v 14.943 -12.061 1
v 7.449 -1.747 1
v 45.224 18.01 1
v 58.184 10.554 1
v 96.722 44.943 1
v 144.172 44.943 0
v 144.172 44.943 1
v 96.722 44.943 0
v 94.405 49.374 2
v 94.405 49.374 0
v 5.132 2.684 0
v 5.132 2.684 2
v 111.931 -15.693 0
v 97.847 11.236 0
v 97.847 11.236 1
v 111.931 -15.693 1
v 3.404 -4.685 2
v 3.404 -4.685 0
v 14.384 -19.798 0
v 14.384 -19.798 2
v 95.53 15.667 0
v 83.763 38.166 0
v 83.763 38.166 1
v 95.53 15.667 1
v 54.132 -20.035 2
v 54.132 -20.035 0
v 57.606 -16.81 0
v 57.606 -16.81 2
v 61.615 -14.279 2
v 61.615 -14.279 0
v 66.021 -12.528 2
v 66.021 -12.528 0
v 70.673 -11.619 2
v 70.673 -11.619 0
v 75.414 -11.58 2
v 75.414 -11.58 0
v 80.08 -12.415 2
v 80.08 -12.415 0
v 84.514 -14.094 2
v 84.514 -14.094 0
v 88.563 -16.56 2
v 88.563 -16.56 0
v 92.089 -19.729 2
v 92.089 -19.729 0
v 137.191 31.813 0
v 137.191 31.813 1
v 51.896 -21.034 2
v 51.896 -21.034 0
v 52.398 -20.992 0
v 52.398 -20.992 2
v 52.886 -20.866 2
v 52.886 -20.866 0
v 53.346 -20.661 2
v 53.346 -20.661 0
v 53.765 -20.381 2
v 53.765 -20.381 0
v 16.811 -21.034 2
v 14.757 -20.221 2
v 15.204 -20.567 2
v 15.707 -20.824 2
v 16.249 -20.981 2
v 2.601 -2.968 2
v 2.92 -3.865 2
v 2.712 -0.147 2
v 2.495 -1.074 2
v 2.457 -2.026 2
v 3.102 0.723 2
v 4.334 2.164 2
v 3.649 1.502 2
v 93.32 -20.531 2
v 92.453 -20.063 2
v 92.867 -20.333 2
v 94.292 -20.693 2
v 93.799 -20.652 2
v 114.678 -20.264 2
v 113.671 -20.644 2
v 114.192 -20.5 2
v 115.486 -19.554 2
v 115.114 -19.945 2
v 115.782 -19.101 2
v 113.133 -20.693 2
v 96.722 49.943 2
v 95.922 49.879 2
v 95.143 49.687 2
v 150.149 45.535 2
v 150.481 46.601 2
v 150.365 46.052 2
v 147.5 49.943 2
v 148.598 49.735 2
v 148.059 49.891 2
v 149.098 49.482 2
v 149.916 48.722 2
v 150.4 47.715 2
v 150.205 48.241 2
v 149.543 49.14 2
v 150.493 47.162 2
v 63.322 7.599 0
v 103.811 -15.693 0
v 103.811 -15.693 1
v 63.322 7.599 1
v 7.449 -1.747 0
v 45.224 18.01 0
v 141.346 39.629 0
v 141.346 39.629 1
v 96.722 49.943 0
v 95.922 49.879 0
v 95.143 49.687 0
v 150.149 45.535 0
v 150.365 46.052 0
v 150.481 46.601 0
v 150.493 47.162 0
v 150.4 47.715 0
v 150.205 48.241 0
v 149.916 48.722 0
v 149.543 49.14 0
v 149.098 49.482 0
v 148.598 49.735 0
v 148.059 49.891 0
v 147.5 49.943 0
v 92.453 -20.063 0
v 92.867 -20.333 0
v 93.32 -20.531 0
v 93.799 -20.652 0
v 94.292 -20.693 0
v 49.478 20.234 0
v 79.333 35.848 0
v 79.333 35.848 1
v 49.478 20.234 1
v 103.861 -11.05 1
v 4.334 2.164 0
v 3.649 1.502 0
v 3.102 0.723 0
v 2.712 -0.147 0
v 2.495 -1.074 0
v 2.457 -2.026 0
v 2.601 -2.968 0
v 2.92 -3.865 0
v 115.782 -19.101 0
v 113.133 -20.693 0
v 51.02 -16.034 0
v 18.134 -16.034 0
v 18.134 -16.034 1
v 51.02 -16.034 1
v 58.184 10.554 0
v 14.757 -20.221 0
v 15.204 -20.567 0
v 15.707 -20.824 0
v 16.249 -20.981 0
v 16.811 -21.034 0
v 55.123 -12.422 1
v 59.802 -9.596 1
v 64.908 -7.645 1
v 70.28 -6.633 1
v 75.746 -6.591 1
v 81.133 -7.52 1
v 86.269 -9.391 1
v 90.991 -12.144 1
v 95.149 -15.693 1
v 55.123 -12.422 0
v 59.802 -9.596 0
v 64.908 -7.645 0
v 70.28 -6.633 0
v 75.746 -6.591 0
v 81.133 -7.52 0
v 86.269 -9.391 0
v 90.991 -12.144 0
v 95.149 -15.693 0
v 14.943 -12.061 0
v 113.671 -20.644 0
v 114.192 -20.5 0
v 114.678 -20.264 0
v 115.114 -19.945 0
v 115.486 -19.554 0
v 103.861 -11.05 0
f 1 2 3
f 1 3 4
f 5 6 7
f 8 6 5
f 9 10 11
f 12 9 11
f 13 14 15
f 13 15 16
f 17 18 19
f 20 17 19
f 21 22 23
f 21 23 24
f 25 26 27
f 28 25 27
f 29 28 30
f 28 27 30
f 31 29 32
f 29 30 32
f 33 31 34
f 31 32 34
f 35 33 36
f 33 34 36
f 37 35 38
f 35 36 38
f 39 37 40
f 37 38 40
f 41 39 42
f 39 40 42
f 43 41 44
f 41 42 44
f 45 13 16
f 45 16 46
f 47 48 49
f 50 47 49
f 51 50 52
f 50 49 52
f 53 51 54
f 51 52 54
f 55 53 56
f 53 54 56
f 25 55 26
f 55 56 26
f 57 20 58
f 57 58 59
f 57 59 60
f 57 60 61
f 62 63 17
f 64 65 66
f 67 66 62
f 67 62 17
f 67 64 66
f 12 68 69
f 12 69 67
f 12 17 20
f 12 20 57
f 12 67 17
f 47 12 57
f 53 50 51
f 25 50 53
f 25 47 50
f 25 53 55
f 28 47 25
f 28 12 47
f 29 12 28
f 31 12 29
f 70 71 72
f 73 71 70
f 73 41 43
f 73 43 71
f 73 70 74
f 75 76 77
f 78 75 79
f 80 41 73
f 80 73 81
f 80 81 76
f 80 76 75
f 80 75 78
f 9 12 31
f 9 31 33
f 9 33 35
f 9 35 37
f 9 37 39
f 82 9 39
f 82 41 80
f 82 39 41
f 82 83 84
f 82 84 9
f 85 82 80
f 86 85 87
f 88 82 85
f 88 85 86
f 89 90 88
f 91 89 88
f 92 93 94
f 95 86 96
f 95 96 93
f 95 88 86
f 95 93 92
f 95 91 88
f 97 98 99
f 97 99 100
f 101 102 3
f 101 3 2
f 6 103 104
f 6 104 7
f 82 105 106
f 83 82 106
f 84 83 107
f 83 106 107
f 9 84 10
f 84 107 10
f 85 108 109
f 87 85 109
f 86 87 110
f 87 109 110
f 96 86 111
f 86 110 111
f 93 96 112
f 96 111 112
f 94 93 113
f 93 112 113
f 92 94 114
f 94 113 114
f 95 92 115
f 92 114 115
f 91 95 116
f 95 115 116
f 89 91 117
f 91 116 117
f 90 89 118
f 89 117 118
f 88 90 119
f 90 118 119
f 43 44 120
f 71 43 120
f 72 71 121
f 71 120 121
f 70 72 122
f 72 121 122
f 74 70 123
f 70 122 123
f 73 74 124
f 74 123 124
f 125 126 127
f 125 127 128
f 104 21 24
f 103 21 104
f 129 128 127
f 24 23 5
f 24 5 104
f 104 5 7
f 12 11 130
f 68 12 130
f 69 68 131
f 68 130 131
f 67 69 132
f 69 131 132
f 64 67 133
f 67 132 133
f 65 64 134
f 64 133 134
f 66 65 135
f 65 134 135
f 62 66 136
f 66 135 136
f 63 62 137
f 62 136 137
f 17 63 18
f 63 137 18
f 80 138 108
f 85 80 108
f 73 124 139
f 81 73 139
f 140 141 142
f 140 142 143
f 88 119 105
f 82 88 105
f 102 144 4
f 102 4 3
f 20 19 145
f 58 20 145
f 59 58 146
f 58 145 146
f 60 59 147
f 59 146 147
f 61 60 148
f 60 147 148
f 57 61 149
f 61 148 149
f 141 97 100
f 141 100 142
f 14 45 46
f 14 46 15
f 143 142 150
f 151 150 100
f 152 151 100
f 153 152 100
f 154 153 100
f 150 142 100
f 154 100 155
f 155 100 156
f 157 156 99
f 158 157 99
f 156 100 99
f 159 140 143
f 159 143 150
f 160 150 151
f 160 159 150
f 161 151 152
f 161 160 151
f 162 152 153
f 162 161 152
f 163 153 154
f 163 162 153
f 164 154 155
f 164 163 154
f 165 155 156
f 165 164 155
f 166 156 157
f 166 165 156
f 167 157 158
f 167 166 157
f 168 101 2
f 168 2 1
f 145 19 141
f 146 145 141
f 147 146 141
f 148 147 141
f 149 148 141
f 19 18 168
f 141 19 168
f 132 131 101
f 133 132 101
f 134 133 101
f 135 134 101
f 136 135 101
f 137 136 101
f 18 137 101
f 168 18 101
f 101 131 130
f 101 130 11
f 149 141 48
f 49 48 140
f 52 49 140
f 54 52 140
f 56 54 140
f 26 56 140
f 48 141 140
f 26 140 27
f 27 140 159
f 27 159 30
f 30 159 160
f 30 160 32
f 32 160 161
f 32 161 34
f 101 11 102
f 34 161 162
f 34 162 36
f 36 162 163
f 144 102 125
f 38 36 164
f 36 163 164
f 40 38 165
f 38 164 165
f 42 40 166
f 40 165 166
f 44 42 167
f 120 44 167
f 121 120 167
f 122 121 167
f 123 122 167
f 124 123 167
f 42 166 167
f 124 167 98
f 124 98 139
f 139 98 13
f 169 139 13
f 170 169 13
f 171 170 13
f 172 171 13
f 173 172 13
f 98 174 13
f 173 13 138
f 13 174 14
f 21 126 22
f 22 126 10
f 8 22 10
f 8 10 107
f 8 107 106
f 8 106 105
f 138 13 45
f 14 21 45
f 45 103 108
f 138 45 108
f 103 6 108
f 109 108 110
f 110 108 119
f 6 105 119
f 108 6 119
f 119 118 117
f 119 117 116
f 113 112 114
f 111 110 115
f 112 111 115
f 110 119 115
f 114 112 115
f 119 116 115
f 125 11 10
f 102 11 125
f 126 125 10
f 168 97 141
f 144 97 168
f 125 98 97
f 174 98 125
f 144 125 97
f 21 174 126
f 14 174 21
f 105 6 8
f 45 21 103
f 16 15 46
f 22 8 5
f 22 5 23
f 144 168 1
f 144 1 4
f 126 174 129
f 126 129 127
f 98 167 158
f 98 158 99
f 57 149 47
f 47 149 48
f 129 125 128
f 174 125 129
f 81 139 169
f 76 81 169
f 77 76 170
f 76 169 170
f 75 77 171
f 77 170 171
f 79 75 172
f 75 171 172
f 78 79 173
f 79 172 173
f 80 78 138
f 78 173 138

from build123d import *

# Parameters (mm, degrees)
F1_DEPTH = 2
F2_DEPTH = 1


# Not quite as in the source:
# - a feature names something its author has since deleted; it is built from what else it names


with BuildPart() as f1:
    # F0 (on Top) → F1 (new body)
    with BuildSketch(Plane.XY):
        with BuildLine():
            ThreePointArc((5.132071007, 2.6840715959), (2.5813003046, -0.6052114789), (3.40420502, -4.6854862431))
            Line((3.40420502, -4.6854862431), (14.383941925, -19.7977976106))
            ThreePointArc((14.383941925, -19.7977976106), (15.4490214089, -20.7074614263), (16.8109929081, -21.0344418537))
            Line((16.8109929081, -21.0344418537), (51.8963127054, -21.0344418537))
            ThreePointArc((51.8963127054, -21.0344418537), (53.12065768, -20.7732334455), (54.1317965199, -20.035094776))
            ThreePointArc((54.1317965199, -20.035094776), (73.0425506447, -11.4896803777), (92.0885582947, -19.7292387035))
            ThreePointArc((92.0885582947, -19.7292387035), (93.0892746148, -20.4413889466), (94.2915113407, -20.6928208003))
            Line((94.2915113407, -20.6928208003), (113.1330302084, -20.6928208003))
            ThreePointArc((113.1330302084, -20.6928208003), (114.6781444331, -20.2643227024), (115.781872987, -19.1012354886))
            Line((115.781872987, -19.1012354886), (150.1493414199, 45.5345719401))
            ThreePointArc((150.1493414199, 45.5345719401), (150.0720005434, 48.4881008532), (147.5004986413, 49.9429866284))
            Line((147.5004986413, 49.9429866284), (96.7218968968, 49.9429866284))
            ThreePointArc((96.7218968968, 49.9429866284), (95.5288247883, 49.7985585766), (94.4046779119, 49.373618206))
            Line((94.4046779119, 49.373618206), (5.132071007, 2.6840715959))
        make_face()
        with BuildLine():
            Line((83.7633376258, 38.1656639161), (96.7218969194, 44.9429865363))
            Line((96.7218969194, 44.9429865363), (144.1719395233, 44.9429865363))
            Line((144.1719395233, 44.9429865363), (141.3464313092, 39.6289784601))
            Line((141.3464313092, 39.6289784601), (137.1905609573, 31.8129231027))
            Line((137.1905609573, 31.8129231027), (111.931308915, -15.6928207082))
            Line((111.931308915, -15.6928207082), (103.8109142352, -15.6928207082))
            Line((103.8109142352, -15.6928207082), (95.14885507, -15.6928207082))
            ThreePointArc((95.14885507, -15.6928207082), (73.0119644332, -6.489765959), (51.0202089869, -16.0344417616))
            Line((51.0202089869, -16.0344417616), (18.1341059978, -16.0344417616))
            Line((18.1341059978, -16.0344417616), (17.830043854, -16.0344417616))
            Line((17.830043854, -16.0344417616), (14.9430452948, -12.0608291403))
            Line((14.9430452948, -12.0608291403), (7.4492901291, -1.7465600138))
            Line((7.4492901291, -1.7465600138), (45.2243497545, 18.0097848295))
            Line((45.2243497545, 18.0097848295), (49.4777560689, 20.234315055))
            Line((49.4777560689, 20.234315055), (79.3327060482, 35.8484449312))
            Line((79.3327060482, 35.8484449312), (83.7633376258, 38.1656639161))
        make_face(mode=Mode.SUBTRACT)
        Polygon((144.1719395233, 44.9429865363), (96.7218969194, 44.9429865363), (83.7633376258, 38.1656639161), (95.5301042855, 15.6670531815), (141.3464313092, 39.6289784601), align=None)
        Polygon((103.8606077396, -11.0500555872), (79.3327060482, 35.8484449312), (49.4777560689, 20.234315055), align=None)
        Polygon((58.1843801115, 10.554375987), (45.2243497545, 18.0097848295), (7.4492901291, -1.7465600138), (14.9430452948, -12.0608291403), align=None)
        Polygon((95.5301042855, 15.6670531815), (83.7633376258, 38.1656639161), (79.3327060482, 35.8484449312), (103.8606077396, -11.0500555872), (49.4777560689, 20.234315055), (45.2243497545, 18.0097848295), (58.1843801115, 10.554375987), (14.9430452948, -12.0608291403), (17.830043854, -16.0344417616), (18.1341059978, -16.0344417616), (63.3220791259, 7.5988546181), (103.8109142352, -15.6928207082), (111.931308915, -15.6928207082), (97.8473232704, 11.236421604), (137.1905609573, 31.8129231027), (141.3464313092, 39.6289784601), align=None)
        with BuildLine():
            Line((95.14885507, -15.6928207082), (103.8109142352, -15.6928207082))
            Line((103.8109142352, -15.6928207082), (63.3220791259, 7.5988546181))
            Line((63.3220791259, 7.5988546181), (18.1341059978, -16.0344417616))
            Line((18.1341059978, -16.0344417616), (51.0202089869, -16.0344417616))
            ThreePointArc((51.0202089869, -16.0344417616), (73.0119644332, -6.489765959), (95.14885507, -15.6928207082))
        make_face()
        Polygon((111.931308915, -15.6928207082), (137.1905609573, 31.8129231027), (97.8473232704, 11.236421604), align=None)
    extrude(amount=F1_DEPTH)

    # F0 (on Top) → F2 (cut)
    with BuildSketch(Plane.XY):
        Polygon((144.1719395233, 44.9429865363), (96.7218969194, 44.9429865363), (83.7633376258, 38.1656639161), (95.5301042855, 15.6670531815), (141.3464313092, 39.6289784601), align=None)
        Polygon((103.8606077396, -11.0500555872), (79.3327060482, 35.8484449312), (49.4777560689, 20.234315055), align=None)
        Polygon((111.931308915, -15.6928207082), (137.1905609573, 31.8129231027), (97.8473232704, 11.236421604), align=None)
        Polygon((58.1843801115, 10.554375987), (45.2243497545, 18.0097848295), (7.4492901291, -1.7465600138), (14.9430452948, -12.0608291403), align=None)
        with BuildLine():
            Line((95.14885507, -15.6928207082), (103.8109142352, -15.6928207082))
            Line((103.8109142352, -15.6928207082), (63.3220791259, 7.5988546181))
            Line((63.3220791259, 7.5988546181), (18.1341059978, -16.0344417616))
            Line((18.1341059978, -16.0344417616), (51.0202089869, -16.0344417616))
            ThreePointArc((51.0202089869, -16.0344417616), (73.0119644332, -6.489765959), (95.14885507, -15.6928207082))
        make_face()
    extrude(amount=F2_DEPTH, mode=Mode.SUBTRACT)


solid = f1.part
